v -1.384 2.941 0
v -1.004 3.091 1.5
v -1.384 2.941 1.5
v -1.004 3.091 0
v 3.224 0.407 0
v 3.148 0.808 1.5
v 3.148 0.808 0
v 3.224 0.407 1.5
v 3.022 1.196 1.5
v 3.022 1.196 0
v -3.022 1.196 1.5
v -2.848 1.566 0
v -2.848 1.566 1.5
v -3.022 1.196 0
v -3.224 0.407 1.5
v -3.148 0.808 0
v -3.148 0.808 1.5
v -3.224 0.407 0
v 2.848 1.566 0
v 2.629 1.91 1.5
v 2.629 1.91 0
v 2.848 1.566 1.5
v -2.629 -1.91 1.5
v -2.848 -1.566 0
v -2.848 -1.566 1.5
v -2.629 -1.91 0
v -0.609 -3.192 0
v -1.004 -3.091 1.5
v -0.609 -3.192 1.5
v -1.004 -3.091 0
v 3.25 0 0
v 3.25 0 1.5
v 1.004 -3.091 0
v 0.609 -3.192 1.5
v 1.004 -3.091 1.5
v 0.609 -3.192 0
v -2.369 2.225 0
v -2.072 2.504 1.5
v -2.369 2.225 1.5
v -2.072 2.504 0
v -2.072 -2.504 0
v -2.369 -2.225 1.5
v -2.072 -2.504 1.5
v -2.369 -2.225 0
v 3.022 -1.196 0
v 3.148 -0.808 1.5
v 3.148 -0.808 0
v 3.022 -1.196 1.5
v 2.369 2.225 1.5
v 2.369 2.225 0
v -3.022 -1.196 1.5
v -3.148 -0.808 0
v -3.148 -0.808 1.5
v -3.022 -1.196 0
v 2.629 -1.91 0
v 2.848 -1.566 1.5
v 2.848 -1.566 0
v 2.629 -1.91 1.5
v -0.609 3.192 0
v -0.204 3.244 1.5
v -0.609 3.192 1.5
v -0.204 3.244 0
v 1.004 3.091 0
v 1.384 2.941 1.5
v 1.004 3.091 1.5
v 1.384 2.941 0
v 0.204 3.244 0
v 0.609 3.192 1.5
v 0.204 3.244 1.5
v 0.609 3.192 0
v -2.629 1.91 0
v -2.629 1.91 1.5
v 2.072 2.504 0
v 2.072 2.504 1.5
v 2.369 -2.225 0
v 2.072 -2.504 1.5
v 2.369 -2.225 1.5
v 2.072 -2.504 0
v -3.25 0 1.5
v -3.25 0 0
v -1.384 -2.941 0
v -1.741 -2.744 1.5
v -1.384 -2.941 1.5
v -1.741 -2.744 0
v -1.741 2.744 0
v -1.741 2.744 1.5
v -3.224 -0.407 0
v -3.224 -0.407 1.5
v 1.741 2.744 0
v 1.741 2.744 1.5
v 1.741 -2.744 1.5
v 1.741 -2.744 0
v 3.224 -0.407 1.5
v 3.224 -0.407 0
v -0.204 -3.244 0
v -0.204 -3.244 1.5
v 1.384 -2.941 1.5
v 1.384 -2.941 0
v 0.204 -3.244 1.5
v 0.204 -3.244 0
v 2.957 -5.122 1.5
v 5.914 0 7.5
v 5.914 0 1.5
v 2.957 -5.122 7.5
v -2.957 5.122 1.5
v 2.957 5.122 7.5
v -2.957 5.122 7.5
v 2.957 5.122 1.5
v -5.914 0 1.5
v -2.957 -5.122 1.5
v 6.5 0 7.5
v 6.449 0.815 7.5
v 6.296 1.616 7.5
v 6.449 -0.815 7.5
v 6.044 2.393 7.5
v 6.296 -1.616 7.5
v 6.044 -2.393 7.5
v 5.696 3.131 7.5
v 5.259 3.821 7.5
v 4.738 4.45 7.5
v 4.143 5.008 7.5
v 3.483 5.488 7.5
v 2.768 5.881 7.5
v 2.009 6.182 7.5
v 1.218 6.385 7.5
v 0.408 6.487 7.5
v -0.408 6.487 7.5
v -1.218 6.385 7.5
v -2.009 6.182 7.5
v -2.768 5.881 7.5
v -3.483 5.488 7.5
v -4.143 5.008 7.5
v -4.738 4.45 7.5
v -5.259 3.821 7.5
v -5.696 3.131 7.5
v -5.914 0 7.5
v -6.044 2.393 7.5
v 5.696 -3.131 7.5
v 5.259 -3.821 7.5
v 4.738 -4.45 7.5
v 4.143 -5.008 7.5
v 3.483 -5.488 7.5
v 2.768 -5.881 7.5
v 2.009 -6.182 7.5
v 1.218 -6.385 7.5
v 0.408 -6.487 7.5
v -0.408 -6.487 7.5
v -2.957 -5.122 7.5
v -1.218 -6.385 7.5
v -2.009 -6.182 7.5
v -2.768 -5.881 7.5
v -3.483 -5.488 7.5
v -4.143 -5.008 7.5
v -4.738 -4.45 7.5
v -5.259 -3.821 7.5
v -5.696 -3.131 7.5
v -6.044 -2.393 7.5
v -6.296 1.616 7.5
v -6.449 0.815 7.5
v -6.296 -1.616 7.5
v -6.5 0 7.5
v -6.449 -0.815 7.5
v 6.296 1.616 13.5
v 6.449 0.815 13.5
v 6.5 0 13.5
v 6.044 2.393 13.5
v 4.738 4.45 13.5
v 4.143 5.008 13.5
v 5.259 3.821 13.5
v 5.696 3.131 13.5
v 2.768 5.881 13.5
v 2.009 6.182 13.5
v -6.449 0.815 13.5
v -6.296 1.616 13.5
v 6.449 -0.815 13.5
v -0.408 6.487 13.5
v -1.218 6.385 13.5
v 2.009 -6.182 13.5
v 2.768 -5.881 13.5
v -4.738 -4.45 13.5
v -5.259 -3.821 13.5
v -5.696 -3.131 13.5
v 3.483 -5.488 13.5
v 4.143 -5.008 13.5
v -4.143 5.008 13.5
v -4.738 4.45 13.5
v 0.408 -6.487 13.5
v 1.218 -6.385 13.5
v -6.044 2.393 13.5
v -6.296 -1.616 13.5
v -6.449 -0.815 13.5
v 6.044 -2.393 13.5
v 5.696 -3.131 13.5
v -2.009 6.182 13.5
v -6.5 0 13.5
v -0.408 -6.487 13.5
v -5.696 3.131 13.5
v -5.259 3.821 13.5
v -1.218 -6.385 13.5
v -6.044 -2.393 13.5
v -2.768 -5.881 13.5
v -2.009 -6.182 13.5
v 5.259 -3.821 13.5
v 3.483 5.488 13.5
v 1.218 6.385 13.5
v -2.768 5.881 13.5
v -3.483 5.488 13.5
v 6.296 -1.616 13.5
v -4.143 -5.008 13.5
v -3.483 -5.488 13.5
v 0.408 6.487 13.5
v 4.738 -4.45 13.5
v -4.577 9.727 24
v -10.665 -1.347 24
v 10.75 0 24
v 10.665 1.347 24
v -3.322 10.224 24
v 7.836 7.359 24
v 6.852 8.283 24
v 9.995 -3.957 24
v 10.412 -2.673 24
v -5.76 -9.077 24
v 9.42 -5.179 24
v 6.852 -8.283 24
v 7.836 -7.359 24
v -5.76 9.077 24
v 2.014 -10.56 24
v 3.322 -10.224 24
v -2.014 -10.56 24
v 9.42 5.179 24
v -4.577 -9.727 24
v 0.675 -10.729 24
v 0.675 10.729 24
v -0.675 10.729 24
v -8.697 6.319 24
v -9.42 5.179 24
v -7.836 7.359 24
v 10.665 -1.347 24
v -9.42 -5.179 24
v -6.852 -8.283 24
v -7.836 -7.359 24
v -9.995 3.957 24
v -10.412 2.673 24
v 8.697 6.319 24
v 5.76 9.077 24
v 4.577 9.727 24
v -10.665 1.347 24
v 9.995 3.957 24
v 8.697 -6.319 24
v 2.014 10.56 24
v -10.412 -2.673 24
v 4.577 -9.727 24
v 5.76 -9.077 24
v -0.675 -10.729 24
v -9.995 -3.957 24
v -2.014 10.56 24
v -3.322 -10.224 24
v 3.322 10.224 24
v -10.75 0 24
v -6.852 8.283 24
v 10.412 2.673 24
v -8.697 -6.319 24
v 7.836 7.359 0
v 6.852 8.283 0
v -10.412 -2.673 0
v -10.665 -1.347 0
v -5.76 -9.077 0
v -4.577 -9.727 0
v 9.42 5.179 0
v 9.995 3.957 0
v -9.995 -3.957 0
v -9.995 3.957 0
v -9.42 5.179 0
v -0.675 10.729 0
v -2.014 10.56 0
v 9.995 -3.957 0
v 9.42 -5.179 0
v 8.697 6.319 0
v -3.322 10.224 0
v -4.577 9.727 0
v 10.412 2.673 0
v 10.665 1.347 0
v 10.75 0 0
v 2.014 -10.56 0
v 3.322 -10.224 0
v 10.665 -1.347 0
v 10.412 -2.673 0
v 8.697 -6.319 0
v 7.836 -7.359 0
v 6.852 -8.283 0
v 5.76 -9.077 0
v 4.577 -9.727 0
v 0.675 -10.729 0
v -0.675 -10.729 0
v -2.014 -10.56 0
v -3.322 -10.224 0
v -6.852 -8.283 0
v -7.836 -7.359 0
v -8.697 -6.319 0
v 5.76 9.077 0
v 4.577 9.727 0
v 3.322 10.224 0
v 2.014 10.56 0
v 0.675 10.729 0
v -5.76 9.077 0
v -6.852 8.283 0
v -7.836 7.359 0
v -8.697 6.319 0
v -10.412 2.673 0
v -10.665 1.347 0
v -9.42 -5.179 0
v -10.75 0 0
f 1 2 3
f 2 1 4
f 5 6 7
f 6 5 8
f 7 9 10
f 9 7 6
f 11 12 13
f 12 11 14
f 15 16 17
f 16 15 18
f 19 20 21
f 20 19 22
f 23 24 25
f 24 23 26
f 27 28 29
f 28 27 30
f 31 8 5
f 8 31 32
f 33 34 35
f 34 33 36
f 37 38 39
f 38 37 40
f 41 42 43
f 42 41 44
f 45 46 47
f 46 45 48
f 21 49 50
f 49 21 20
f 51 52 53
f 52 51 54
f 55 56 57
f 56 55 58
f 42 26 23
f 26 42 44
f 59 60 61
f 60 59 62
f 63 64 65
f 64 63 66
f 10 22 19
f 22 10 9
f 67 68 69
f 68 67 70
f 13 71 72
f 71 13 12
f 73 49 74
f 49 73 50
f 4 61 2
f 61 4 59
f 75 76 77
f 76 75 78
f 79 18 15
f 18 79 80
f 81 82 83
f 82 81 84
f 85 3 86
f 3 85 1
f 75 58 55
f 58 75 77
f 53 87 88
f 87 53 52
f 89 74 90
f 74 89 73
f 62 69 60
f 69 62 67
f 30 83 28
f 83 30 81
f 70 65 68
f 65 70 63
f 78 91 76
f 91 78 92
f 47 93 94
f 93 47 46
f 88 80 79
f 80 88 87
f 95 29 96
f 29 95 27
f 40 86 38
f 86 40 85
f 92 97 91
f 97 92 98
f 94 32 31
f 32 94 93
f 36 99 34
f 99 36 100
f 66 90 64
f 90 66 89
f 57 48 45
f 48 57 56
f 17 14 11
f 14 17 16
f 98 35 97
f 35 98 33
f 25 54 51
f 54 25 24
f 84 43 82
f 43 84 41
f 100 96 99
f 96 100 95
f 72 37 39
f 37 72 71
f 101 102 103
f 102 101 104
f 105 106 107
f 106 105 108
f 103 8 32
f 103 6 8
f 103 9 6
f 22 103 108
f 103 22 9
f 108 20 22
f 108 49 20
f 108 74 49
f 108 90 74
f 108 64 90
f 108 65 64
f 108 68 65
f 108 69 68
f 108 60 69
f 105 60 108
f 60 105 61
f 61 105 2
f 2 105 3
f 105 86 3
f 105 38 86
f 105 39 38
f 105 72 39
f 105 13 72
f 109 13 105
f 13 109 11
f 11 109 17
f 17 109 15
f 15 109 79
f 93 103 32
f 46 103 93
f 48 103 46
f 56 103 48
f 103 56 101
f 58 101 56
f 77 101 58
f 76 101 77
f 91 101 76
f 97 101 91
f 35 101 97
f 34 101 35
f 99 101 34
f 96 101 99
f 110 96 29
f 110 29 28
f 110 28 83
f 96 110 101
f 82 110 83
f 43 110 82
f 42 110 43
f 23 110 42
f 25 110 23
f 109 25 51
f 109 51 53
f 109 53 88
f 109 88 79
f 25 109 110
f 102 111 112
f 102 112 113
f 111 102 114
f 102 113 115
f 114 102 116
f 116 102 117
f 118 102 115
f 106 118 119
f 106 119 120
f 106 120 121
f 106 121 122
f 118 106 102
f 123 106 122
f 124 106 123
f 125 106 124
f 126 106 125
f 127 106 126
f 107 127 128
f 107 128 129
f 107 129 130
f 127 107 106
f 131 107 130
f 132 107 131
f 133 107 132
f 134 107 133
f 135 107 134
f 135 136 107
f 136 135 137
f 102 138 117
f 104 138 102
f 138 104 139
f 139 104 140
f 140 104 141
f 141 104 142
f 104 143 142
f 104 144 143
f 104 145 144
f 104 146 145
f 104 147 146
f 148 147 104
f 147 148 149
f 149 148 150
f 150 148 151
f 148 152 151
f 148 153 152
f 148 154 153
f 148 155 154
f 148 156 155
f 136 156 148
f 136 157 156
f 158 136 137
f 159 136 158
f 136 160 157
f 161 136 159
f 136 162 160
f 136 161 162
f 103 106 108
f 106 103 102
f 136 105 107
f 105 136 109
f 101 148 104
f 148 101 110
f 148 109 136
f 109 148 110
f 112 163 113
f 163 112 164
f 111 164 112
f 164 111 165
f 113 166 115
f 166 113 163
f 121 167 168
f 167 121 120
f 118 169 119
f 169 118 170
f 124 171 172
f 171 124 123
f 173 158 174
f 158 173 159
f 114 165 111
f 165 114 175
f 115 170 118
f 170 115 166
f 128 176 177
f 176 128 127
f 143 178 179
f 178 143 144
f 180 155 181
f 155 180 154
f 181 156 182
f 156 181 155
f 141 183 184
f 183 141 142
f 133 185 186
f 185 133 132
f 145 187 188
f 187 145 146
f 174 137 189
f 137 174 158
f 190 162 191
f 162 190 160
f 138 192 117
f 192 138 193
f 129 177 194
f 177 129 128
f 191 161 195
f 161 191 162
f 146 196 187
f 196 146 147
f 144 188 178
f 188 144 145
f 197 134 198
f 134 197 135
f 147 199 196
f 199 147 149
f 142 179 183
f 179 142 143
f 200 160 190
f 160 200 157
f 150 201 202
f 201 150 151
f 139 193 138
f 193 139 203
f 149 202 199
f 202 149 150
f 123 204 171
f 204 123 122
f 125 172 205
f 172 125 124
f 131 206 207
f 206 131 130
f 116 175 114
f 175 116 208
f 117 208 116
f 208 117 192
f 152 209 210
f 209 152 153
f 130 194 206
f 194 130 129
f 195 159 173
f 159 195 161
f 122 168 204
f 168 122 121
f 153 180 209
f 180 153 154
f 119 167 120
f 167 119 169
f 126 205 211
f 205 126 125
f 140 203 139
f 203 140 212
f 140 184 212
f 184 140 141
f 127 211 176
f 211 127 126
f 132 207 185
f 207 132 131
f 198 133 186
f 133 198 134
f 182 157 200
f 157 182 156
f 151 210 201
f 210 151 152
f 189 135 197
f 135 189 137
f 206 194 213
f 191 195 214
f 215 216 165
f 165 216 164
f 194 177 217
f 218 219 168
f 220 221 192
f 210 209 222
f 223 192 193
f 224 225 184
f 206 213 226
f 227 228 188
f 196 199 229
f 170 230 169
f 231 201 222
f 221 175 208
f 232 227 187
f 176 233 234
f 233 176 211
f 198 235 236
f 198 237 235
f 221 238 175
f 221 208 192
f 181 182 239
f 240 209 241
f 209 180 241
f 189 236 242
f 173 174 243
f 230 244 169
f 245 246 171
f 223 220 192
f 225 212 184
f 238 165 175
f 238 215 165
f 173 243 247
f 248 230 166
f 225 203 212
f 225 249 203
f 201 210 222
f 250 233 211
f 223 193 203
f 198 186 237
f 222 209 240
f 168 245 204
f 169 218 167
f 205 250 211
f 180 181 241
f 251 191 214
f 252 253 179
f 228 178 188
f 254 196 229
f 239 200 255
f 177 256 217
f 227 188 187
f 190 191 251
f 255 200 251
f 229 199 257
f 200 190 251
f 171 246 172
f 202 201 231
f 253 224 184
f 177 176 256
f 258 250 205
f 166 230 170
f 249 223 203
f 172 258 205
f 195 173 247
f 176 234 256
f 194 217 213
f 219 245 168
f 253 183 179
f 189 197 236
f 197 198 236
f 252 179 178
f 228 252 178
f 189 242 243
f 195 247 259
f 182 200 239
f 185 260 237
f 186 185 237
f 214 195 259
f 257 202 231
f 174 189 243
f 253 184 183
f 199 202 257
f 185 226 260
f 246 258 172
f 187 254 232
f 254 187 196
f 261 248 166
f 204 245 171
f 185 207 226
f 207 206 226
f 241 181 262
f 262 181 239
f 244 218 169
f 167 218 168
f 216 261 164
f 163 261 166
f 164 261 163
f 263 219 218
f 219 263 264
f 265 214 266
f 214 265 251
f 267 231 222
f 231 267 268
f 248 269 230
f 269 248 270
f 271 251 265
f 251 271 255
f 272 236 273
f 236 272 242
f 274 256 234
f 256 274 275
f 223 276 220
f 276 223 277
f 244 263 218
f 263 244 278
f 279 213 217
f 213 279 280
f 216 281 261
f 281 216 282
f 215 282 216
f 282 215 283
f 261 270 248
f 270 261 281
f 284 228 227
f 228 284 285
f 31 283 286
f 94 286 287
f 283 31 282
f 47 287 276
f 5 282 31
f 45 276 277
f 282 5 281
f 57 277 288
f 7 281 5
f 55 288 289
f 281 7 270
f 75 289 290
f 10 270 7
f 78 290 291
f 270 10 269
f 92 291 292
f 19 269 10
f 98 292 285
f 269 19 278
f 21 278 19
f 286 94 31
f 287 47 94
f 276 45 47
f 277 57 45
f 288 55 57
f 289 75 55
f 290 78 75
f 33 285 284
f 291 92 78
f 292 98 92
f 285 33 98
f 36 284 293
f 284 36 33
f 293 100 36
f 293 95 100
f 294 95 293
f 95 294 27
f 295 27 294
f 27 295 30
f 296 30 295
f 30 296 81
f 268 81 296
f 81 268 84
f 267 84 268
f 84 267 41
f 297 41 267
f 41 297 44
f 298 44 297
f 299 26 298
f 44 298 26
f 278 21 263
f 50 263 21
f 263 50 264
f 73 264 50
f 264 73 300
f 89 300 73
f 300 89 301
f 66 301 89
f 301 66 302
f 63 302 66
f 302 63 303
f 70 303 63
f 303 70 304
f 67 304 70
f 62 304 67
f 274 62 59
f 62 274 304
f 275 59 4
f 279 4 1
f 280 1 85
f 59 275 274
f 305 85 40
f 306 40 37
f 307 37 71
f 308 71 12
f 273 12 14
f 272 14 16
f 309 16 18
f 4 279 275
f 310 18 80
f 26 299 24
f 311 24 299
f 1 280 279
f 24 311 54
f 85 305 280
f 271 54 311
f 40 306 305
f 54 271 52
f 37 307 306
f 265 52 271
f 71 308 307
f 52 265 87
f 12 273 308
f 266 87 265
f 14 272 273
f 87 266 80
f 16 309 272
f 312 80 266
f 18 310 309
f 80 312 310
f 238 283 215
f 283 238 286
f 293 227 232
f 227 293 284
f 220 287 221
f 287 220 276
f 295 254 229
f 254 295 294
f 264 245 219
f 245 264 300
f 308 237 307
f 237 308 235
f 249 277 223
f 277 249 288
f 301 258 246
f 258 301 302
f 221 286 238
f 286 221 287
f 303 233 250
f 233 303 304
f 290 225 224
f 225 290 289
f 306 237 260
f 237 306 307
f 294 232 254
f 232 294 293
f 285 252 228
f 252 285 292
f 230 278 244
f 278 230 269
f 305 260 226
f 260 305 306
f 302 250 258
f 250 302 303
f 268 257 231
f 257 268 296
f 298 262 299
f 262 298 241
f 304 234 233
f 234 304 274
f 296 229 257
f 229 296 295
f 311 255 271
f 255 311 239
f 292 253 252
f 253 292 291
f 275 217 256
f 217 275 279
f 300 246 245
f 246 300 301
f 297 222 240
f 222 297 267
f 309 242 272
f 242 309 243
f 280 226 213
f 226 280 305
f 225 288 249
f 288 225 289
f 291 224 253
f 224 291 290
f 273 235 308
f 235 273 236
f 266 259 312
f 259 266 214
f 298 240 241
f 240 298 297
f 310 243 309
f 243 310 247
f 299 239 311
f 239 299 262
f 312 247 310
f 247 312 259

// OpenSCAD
$fn = 50;


difference() {
	union() {
		cylinder(h = 24, r = 10.7500000000);
	}
	union() {
		translate(v = [0, 0, 0]) {
			rotate(a = [0, 0, 0]) {
				difference() {
					union() {
						translate(v = [0, 0, -50.0000000000]) {
							cylinder(h = 100, r = 3.2500000000);
						}
					}
					union();
				}
			}
		}
		translate(v = [0, 0, 1.5000000000]) {
			rotate(a = [0, 0, 0]) {
				difference() {
					union() {
						linear_extrude(height = 6) {
							polygon(points = [[5.9142500000, 0.0000000000], [2.9571250000, 5.1218907443], [-2.9571250000, 5.1218907443], [-5.9142500000, 0.0000000000], [-2.9571250000, -5.1218907443], [2.9571250000, -5.1218907443]]);
						}
					}
					union();
				}
			}
		}
		translate(v = [0, 0, 7.5000000000]) {
			cylinder(h = 6, r = 6.5000000000);
		}
		translate(v = [0, 0, 13.5000000000]) {
			cylinder(h = 10.5000000000, r1 = 6.5000000000, r2 = 10.7500000000);
		}
	}
}
